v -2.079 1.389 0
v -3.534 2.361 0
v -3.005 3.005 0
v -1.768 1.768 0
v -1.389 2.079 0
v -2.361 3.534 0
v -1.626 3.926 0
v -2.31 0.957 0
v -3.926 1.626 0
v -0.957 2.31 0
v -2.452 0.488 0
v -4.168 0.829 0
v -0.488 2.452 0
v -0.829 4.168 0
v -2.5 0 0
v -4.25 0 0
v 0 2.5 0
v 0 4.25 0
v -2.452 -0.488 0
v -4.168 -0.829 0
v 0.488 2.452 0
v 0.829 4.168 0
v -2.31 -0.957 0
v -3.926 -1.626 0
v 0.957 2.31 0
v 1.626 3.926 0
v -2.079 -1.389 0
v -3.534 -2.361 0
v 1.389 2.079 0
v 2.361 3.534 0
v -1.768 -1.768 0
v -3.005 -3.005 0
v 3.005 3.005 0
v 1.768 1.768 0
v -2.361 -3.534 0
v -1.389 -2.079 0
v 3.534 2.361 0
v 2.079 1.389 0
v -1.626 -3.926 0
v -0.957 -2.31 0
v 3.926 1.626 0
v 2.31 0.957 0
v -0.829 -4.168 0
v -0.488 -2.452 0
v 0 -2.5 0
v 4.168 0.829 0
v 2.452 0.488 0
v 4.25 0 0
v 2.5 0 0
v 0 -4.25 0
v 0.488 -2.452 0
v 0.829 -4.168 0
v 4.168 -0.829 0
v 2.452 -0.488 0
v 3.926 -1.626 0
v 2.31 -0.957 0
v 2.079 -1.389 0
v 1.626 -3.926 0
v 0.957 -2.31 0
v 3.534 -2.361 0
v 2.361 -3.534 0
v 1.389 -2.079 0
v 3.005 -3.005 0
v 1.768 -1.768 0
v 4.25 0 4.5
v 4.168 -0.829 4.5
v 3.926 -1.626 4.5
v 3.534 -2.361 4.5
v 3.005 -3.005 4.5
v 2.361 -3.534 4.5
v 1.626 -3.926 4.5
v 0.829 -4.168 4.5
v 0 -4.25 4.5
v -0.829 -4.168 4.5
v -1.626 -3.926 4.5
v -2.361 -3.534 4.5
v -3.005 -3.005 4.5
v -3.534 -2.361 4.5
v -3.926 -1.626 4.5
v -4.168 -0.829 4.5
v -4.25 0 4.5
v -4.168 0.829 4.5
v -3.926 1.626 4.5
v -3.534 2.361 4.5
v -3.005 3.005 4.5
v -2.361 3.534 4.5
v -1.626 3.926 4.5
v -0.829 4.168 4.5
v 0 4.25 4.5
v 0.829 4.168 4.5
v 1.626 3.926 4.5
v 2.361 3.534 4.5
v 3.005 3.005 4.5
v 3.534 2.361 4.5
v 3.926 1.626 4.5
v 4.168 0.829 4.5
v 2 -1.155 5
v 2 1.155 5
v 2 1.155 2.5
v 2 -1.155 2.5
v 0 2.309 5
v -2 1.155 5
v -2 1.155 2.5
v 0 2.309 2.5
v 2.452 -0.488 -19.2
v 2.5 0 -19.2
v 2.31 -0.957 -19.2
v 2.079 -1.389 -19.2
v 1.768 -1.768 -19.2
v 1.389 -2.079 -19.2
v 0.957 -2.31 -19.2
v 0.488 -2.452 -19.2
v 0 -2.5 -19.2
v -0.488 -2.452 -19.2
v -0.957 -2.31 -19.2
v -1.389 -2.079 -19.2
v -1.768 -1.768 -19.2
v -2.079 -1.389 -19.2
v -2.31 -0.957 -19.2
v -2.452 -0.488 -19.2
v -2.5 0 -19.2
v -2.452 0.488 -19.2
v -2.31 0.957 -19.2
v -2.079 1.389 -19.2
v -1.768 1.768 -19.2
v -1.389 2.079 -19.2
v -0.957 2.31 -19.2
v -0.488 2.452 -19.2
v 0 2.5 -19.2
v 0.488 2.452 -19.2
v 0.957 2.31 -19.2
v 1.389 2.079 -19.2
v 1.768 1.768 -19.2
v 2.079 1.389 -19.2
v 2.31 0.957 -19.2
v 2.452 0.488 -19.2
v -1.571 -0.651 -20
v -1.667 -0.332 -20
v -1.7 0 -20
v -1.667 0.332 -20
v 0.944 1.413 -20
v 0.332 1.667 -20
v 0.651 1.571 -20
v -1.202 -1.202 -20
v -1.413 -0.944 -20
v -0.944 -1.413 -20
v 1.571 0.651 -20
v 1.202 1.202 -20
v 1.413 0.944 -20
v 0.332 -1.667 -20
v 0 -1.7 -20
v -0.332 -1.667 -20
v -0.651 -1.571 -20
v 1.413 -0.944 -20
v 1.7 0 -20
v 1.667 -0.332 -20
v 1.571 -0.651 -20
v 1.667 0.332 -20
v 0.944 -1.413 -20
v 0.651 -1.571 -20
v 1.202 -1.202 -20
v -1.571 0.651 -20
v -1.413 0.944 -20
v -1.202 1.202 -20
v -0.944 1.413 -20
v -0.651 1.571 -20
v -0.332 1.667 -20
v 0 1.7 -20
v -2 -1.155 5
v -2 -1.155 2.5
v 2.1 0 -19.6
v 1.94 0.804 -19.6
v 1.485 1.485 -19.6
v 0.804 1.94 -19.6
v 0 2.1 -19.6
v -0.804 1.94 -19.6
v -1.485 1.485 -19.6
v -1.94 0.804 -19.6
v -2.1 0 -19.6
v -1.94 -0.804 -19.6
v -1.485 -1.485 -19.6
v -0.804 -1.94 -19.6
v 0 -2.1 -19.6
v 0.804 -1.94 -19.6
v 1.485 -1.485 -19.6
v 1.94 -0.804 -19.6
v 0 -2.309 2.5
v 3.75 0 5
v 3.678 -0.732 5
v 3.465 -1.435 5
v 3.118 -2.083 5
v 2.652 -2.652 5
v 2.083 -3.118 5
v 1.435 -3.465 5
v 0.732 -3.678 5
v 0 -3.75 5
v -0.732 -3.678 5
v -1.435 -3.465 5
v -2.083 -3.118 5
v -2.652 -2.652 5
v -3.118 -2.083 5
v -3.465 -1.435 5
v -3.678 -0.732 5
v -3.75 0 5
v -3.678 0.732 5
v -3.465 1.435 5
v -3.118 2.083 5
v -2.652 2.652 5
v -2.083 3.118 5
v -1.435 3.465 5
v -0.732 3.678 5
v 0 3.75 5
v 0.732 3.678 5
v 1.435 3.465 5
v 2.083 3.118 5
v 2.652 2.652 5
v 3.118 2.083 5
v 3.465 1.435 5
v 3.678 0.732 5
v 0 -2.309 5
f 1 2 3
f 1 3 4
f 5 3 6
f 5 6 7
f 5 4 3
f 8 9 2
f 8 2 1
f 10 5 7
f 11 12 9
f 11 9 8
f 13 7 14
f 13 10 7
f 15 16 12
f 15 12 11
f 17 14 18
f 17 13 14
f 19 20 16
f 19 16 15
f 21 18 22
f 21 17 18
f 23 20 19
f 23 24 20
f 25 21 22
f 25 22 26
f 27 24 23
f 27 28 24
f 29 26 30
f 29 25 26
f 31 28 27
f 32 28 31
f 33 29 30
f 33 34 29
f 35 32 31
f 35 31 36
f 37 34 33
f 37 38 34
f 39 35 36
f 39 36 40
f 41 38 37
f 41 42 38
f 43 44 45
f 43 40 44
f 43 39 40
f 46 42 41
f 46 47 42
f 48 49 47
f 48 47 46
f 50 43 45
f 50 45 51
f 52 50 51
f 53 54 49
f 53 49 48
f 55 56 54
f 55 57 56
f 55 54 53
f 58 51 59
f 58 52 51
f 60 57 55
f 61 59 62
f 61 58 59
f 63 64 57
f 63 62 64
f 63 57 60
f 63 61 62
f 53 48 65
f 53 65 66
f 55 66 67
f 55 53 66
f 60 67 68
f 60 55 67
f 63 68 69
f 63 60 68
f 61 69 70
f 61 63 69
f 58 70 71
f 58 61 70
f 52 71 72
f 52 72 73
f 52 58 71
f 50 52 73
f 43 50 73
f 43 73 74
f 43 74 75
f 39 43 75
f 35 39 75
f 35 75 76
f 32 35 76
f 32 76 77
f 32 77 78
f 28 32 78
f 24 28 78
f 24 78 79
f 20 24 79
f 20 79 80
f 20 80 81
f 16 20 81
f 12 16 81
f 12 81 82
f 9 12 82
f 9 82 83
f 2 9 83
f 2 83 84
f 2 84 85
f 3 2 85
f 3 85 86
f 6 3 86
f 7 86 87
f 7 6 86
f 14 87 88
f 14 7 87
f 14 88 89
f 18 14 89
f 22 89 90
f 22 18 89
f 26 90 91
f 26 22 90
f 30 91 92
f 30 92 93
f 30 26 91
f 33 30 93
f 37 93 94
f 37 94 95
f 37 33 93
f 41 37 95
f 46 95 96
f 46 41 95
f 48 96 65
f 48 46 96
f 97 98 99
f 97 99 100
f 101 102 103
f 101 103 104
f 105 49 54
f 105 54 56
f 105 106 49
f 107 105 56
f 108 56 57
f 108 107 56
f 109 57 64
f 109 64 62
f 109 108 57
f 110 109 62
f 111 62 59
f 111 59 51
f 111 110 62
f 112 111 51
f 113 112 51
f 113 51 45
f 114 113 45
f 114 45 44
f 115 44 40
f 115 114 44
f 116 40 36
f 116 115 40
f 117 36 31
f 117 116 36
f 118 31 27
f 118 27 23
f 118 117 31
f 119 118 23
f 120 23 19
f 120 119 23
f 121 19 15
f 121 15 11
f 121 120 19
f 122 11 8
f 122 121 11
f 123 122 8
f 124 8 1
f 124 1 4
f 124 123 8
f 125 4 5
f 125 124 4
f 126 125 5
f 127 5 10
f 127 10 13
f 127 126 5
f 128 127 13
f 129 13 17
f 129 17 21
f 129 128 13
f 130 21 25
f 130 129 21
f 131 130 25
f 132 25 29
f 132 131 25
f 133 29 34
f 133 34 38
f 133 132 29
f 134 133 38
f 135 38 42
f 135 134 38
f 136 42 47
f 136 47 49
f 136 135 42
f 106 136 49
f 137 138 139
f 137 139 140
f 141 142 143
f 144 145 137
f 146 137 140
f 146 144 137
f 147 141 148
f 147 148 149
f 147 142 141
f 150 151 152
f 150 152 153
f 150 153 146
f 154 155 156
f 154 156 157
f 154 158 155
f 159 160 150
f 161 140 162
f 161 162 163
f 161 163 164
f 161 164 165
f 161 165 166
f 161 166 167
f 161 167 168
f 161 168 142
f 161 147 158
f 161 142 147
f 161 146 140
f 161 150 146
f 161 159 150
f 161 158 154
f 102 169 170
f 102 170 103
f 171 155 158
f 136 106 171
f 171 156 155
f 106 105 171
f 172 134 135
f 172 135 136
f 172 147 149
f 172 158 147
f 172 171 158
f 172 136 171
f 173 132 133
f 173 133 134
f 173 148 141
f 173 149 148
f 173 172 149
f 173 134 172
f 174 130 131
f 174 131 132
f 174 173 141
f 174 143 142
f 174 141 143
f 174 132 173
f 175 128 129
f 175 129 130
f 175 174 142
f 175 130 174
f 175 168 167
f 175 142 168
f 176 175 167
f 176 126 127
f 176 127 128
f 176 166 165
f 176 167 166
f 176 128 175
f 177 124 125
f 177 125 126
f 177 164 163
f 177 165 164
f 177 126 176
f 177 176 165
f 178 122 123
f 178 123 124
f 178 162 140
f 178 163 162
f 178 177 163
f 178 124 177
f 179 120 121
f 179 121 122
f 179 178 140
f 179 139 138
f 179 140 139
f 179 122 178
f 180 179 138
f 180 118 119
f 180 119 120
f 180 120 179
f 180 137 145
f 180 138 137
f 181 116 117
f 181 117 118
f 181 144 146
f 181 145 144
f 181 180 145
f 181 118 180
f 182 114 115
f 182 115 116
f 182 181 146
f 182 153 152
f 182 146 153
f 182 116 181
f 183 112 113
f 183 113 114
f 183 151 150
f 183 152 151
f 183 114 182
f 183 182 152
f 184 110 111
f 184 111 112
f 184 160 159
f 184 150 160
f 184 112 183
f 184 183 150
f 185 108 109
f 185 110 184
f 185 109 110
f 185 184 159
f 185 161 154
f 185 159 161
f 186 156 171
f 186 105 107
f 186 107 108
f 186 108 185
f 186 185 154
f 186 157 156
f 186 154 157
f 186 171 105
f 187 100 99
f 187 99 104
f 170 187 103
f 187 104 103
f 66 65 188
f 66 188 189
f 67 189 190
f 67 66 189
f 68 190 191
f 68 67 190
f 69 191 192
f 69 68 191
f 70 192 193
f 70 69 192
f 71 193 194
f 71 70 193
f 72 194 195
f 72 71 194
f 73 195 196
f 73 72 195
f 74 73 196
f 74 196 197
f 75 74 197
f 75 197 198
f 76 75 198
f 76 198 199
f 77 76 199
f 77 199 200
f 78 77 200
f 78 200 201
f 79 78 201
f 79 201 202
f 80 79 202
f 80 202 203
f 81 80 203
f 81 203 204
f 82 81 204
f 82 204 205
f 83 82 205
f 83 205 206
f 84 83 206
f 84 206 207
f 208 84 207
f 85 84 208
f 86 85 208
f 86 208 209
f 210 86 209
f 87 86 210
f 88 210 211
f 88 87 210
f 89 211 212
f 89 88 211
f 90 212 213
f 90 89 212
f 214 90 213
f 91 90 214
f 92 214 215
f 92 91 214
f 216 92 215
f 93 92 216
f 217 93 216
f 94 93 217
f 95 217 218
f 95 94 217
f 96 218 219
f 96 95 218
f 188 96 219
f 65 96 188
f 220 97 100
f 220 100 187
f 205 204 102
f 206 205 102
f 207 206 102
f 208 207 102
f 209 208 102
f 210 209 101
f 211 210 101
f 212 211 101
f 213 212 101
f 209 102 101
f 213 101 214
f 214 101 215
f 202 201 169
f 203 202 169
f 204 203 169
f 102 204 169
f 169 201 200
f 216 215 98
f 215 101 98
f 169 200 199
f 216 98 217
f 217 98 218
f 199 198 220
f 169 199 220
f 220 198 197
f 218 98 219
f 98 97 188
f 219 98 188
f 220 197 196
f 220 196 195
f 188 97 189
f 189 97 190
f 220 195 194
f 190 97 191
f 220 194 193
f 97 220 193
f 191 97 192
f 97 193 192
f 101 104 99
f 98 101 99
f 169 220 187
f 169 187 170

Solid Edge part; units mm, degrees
sketch "Sketch1" plane through (0, 0, 0) normal (0, -1, 0) x (1, 0, 0)
  line L0 (0, 5) -> (3.75, 5)
  line L1 (3.75, 5) -> (4.25, 4.5)
  line L2 (4.25, 4.5) -> (4.25, 0)
  line L3 (4.25, 0) -> (2.5, 0)
  line L4 (2.5, 0) -> (2.5, -19.2)
  line L5 (2.5, -19.2) -> (1.7, -20)
  line L6 (1.7, -20) -> (0, -20)
  line L7 (0, -20) -> (0, 5)
  dimension "D1" = 5
  dimension "D2" = 20
  dimension "D3" = 0.8
  dimension "D4" = 0.5
  dimension "D5" = 0.5
revolve "RevolvedProtrusion1" add sketch "Sketch1" angle 360 about axis through (0, 0, 54) along (0, 0, -1)
sketch "Sketch2" plane through (0, 0, 5) normal (0, 0, 1) x (0, 1, 0)
  line L0 (-2.3094, 0) -> (-1.1547, 2)
  line L1 (-1.1547, 2) -> (1.1547, 2)
  line L2 (1.1547, 2) -> (2.3094, 0)
  line L3 (2.3094, 0) -> (1.1547, -2)
  line L4 (1.1547, -2) -> (-1.1547, -2)
  line L5 (-1.1547, -2) -> (-2.3094, 0)
  dimension "D1" = 4
extrude "Cutout1" cut sketch "Sketch2" against normal blind 2.5
cosmetic_thread "Thread1"
properties material "Steel"
